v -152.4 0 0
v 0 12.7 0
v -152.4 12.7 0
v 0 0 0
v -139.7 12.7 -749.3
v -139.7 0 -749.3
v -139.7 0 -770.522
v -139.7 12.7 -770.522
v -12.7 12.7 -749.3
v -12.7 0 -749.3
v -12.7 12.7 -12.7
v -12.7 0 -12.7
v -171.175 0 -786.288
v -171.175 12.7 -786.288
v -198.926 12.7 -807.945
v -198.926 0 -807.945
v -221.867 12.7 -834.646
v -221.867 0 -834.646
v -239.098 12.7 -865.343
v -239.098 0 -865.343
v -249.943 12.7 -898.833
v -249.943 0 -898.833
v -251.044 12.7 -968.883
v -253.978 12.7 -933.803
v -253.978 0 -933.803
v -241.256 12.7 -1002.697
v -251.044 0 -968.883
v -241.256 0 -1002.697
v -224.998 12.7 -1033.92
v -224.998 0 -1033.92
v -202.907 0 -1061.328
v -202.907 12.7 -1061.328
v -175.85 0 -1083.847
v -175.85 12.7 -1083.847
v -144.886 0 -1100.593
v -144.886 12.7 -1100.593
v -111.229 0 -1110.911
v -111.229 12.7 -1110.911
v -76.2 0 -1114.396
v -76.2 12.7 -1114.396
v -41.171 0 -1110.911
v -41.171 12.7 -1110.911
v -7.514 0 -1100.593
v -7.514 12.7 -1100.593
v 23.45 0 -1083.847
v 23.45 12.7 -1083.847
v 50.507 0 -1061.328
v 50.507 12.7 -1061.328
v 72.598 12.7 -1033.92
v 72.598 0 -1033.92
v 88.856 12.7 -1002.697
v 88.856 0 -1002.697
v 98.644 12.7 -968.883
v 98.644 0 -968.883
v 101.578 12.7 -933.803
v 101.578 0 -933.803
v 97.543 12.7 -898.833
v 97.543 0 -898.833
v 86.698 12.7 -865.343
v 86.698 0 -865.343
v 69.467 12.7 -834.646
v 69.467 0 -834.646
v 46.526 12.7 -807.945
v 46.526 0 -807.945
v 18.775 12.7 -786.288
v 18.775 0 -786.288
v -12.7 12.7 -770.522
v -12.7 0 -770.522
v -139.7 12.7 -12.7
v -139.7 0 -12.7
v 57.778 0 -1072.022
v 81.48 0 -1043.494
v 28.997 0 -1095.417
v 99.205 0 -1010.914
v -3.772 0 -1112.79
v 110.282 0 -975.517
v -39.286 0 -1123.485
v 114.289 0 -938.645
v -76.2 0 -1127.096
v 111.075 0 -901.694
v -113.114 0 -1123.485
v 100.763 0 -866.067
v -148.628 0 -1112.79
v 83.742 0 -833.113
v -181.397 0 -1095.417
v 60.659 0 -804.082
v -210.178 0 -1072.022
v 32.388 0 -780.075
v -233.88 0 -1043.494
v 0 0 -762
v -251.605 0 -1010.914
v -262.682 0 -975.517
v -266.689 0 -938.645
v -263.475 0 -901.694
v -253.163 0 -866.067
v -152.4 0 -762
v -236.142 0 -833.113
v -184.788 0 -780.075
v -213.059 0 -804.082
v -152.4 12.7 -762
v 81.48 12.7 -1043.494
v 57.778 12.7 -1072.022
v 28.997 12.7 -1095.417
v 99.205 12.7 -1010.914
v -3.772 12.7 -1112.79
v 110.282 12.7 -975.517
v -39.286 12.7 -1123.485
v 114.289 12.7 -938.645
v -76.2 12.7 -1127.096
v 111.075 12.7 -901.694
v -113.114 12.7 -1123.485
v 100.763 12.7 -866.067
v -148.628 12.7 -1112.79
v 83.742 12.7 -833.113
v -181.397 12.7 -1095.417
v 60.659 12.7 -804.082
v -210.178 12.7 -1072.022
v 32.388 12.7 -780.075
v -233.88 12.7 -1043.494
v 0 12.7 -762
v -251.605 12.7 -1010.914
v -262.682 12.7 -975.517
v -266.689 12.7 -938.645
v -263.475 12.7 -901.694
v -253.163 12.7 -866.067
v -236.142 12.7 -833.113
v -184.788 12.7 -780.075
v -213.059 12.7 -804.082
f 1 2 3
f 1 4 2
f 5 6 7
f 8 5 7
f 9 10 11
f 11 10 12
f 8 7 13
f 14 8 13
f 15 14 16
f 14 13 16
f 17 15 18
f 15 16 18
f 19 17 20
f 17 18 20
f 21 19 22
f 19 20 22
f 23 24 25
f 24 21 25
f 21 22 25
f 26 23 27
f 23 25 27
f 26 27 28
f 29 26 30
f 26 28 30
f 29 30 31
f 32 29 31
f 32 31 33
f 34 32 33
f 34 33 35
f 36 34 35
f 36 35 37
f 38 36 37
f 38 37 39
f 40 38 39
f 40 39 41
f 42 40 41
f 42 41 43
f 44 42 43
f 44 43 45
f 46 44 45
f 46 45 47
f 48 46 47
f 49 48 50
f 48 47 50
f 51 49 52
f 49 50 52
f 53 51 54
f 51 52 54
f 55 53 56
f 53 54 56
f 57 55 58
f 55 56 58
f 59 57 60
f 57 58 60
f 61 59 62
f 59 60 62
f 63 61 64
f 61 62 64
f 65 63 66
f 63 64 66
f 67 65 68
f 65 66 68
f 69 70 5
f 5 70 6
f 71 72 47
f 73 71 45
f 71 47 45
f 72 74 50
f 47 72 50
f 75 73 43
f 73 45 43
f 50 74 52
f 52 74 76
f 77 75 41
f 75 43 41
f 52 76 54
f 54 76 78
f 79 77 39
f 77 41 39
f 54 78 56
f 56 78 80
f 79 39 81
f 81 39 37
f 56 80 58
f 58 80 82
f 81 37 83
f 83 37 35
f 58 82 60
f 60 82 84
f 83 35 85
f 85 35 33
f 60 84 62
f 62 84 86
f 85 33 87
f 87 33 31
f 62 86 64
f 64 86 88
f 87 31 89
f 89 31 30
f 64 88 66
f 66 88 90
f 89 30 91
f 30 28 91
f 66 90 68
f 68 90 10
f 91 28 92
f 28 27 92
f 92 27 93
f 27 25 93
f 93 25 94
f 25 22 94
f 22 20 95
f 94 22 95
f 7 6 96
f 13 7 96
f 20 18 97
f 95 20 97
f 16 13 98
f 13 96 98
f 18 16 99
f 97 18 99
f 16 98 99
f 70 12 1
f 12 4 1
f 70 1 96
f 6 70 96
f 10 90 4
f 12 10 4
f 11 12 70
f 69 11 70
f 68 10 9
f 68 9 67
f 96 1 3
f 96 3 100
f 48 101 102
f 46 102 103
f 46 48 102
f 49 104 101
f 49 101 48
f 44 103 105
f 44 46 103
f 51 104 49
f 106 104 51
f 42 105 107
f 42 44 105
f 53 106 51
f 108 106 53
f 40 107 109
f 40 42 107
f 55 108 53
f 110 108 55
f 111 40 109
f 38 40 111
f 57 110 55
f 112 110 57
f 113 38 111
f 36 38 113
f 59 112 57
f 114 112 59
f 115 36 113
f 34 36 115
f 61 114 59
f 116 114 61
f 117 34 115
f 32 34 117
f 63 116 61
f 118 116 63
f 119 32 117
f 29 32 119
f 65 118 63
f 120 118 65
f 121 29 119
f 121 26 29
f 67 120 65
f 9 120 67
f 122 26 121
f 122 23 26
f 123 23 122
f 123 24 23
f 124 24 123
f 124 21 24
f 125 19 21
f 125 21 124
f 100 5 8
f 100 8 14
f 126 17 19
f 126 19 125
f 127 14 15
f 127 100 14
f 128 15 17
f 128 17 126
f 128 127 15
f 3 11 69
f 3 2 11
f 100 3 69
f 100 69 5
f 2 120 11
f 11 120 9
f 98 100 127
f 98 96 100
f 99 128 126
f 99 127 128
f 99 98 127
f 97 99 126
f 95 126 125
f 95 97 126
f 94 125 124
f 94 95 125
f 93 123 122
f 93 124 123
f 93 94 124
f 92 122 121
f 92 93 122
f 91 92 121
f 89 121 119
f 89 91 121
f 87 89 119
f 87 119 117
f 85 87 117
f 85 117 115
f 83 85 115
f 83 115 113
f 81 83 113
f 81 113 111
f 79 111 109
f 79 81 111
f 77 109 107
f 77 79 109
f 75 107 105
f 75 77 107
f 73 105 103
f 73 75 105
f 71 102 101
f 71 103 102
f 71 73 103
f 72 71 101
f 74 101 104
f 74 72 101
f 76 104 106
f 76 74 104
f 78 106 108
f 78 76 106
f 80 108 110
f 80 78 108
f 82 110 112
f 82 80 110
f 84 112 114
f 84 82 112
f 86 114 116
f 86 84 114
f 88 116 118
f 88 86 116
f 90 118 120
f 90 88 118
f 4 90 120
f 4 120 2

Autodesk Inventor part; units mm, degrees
ref_plane "YZ Plane" through (0, 0, 0) normal (1, 0, 0) x (0, 1, 0)
ref_plane "XZ Plane" through (0, 0, 0) normal (0, 1, 0) x (-1, 0, 0)
ref_plane "XY Plane" through (0, 0, 0) normal (0, 0, 1) x (1, 0, 0)
sketch "Sketch1" plane through (0, 0, 0) normal (0, 1, 0) x (-1, 0, 0)
  line L0 (0, 0) -> (152.4, 0)
  line L1 (152.4, 0) -> (152.4, -762)
  line L2 (0, -762) -> (0, 0)
  line L3 (152.4, -762) -> (0, -762) construction
  arc A0 (0, -762) -> (152.4, -762) centre (76.2, -936.5961) ccw
  line L4 (152.4, -590.1365) -> (152.4, -762) construction
  arc A1 (12.7, -770.5221) -> (139.7, -770.5221) centre (76.2, -936.5961) ccw
  line L5 (12.7, -12.7) -> (139.7, -12.7)
  line L6 (139.7, -12.7) -> (139.7, -749.3)
  line L7 (12.7, -749.3) -> (12.7, -12.7)
  line L8 (12.7, -12.7) -> (139.7, -749.3) construction
  line L9 (139.7, -12.7) -> (12.7, -749.3) construction
  line L10 (12.7, -749.3) -> (12.7, -770.5221)
  line L11 (139.7, -749.3) -> (139.7, -770.5221)
  point P0 (76.2, -381)
  dimension "d0" = 762
  dimension "d1" = 381
  dimension "d2" = 355.6
  dimension "d3" = 762
  dimension "d4" = 127
  dimension "d5" = 736.6
extrude "Extrusion1" add sketch "Sketch1" along normal blind 12.7
properties part number "Arm Layer 2 Out"
